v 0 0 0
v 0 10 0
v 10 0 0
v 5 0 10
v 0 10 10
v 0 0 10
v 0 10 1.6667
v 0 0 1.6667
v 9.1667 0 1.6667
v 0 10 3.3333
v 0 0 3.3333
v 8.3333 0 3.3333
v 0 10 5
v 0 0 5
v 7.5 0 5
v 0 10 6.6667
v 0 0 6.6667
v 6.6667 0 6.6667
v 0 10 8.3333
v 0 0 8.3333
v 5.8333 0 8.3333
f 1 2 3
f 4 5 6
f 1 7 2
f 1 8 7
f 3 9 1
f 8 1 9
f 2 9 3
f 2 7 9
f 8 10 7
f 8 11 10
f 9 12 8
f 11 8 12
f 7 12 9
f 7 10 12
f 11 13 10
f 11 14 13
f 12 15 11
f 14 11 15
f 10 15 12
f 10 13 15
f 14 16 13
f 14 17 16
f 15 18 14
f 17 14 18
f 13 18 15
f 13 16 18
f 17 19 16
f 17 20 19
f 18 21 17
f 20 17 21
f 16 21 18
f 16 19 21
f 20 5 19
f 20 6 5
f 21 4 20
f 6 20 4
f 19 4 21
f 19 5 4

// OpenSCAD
// A straight edge swept by an uneven scale: the bilinear patch through its four
// corners.
//
// A linear extrusion without a twist is an affine map in the sweep parameter,
// and an affine map sweeps a straight edge into the bilinear patch through the
// edge and its image at the far cap - a Bezier patch of degree (1, 1), exact. It
// is a plane exactly when the image is parallel to the edge: the scale sends the
// edge's direction u to (sx u_x, sy u_y), parallel to u when (sx - sy) u_x u_y =
// 0. Here sx = 0.5 and sy = 1, so the two edges along the axes stay planes and
// the hypotenuse, u = (-10, 10), does not. Until 2026-09-25 that wall declared
// nothing at all; see doc/step-export-wip.md, *Inferred where a declaration was
// possible*, item 7.
//
// Declared, from the model: the patch, and four planes - the two caps and the
// walls over the two edges along the axes.
// EXPECT: 1 analytic surface available (0 cylindrical, 0 spherical, 0 toroidal, 1 Bezier), and 4 declared planes
// EXPECT: 4 declared planes: 4 written as a face, 0 read to identify a surface without one standing on them, 0 with no mesh left on them, 0 unexplained
//
// And every facet on one of them: the uneven scale cuts the extrusion into
// slices, but every vertex of every slice is a station of the same affine map,
// so the hypotenuse wall's facets all lie on the patch, however many there are.
// EXPECT: 0 on a surface the approximation fitted, 0 left to the tessellation
//
// Written at D1, as every Bezier patch is today: membership in one is asked by
// projection, not in closed form - though a bilinear patch has one. See the wip.
//
// ROUNDTRIP: BSplineSurface=1 Plane=4
//
// Derived: the section at height z is the triangle with its x scaled by
// 1 - z/20, area 50 (1 - z/20), so the volume is 50 * (10 - 100/40) = 375.
// VOLUME: 375
linear_extrude(height = 10, scale = [0.5, 1]) polygon([[0, 0], [10, 0], [0, 10]]);
